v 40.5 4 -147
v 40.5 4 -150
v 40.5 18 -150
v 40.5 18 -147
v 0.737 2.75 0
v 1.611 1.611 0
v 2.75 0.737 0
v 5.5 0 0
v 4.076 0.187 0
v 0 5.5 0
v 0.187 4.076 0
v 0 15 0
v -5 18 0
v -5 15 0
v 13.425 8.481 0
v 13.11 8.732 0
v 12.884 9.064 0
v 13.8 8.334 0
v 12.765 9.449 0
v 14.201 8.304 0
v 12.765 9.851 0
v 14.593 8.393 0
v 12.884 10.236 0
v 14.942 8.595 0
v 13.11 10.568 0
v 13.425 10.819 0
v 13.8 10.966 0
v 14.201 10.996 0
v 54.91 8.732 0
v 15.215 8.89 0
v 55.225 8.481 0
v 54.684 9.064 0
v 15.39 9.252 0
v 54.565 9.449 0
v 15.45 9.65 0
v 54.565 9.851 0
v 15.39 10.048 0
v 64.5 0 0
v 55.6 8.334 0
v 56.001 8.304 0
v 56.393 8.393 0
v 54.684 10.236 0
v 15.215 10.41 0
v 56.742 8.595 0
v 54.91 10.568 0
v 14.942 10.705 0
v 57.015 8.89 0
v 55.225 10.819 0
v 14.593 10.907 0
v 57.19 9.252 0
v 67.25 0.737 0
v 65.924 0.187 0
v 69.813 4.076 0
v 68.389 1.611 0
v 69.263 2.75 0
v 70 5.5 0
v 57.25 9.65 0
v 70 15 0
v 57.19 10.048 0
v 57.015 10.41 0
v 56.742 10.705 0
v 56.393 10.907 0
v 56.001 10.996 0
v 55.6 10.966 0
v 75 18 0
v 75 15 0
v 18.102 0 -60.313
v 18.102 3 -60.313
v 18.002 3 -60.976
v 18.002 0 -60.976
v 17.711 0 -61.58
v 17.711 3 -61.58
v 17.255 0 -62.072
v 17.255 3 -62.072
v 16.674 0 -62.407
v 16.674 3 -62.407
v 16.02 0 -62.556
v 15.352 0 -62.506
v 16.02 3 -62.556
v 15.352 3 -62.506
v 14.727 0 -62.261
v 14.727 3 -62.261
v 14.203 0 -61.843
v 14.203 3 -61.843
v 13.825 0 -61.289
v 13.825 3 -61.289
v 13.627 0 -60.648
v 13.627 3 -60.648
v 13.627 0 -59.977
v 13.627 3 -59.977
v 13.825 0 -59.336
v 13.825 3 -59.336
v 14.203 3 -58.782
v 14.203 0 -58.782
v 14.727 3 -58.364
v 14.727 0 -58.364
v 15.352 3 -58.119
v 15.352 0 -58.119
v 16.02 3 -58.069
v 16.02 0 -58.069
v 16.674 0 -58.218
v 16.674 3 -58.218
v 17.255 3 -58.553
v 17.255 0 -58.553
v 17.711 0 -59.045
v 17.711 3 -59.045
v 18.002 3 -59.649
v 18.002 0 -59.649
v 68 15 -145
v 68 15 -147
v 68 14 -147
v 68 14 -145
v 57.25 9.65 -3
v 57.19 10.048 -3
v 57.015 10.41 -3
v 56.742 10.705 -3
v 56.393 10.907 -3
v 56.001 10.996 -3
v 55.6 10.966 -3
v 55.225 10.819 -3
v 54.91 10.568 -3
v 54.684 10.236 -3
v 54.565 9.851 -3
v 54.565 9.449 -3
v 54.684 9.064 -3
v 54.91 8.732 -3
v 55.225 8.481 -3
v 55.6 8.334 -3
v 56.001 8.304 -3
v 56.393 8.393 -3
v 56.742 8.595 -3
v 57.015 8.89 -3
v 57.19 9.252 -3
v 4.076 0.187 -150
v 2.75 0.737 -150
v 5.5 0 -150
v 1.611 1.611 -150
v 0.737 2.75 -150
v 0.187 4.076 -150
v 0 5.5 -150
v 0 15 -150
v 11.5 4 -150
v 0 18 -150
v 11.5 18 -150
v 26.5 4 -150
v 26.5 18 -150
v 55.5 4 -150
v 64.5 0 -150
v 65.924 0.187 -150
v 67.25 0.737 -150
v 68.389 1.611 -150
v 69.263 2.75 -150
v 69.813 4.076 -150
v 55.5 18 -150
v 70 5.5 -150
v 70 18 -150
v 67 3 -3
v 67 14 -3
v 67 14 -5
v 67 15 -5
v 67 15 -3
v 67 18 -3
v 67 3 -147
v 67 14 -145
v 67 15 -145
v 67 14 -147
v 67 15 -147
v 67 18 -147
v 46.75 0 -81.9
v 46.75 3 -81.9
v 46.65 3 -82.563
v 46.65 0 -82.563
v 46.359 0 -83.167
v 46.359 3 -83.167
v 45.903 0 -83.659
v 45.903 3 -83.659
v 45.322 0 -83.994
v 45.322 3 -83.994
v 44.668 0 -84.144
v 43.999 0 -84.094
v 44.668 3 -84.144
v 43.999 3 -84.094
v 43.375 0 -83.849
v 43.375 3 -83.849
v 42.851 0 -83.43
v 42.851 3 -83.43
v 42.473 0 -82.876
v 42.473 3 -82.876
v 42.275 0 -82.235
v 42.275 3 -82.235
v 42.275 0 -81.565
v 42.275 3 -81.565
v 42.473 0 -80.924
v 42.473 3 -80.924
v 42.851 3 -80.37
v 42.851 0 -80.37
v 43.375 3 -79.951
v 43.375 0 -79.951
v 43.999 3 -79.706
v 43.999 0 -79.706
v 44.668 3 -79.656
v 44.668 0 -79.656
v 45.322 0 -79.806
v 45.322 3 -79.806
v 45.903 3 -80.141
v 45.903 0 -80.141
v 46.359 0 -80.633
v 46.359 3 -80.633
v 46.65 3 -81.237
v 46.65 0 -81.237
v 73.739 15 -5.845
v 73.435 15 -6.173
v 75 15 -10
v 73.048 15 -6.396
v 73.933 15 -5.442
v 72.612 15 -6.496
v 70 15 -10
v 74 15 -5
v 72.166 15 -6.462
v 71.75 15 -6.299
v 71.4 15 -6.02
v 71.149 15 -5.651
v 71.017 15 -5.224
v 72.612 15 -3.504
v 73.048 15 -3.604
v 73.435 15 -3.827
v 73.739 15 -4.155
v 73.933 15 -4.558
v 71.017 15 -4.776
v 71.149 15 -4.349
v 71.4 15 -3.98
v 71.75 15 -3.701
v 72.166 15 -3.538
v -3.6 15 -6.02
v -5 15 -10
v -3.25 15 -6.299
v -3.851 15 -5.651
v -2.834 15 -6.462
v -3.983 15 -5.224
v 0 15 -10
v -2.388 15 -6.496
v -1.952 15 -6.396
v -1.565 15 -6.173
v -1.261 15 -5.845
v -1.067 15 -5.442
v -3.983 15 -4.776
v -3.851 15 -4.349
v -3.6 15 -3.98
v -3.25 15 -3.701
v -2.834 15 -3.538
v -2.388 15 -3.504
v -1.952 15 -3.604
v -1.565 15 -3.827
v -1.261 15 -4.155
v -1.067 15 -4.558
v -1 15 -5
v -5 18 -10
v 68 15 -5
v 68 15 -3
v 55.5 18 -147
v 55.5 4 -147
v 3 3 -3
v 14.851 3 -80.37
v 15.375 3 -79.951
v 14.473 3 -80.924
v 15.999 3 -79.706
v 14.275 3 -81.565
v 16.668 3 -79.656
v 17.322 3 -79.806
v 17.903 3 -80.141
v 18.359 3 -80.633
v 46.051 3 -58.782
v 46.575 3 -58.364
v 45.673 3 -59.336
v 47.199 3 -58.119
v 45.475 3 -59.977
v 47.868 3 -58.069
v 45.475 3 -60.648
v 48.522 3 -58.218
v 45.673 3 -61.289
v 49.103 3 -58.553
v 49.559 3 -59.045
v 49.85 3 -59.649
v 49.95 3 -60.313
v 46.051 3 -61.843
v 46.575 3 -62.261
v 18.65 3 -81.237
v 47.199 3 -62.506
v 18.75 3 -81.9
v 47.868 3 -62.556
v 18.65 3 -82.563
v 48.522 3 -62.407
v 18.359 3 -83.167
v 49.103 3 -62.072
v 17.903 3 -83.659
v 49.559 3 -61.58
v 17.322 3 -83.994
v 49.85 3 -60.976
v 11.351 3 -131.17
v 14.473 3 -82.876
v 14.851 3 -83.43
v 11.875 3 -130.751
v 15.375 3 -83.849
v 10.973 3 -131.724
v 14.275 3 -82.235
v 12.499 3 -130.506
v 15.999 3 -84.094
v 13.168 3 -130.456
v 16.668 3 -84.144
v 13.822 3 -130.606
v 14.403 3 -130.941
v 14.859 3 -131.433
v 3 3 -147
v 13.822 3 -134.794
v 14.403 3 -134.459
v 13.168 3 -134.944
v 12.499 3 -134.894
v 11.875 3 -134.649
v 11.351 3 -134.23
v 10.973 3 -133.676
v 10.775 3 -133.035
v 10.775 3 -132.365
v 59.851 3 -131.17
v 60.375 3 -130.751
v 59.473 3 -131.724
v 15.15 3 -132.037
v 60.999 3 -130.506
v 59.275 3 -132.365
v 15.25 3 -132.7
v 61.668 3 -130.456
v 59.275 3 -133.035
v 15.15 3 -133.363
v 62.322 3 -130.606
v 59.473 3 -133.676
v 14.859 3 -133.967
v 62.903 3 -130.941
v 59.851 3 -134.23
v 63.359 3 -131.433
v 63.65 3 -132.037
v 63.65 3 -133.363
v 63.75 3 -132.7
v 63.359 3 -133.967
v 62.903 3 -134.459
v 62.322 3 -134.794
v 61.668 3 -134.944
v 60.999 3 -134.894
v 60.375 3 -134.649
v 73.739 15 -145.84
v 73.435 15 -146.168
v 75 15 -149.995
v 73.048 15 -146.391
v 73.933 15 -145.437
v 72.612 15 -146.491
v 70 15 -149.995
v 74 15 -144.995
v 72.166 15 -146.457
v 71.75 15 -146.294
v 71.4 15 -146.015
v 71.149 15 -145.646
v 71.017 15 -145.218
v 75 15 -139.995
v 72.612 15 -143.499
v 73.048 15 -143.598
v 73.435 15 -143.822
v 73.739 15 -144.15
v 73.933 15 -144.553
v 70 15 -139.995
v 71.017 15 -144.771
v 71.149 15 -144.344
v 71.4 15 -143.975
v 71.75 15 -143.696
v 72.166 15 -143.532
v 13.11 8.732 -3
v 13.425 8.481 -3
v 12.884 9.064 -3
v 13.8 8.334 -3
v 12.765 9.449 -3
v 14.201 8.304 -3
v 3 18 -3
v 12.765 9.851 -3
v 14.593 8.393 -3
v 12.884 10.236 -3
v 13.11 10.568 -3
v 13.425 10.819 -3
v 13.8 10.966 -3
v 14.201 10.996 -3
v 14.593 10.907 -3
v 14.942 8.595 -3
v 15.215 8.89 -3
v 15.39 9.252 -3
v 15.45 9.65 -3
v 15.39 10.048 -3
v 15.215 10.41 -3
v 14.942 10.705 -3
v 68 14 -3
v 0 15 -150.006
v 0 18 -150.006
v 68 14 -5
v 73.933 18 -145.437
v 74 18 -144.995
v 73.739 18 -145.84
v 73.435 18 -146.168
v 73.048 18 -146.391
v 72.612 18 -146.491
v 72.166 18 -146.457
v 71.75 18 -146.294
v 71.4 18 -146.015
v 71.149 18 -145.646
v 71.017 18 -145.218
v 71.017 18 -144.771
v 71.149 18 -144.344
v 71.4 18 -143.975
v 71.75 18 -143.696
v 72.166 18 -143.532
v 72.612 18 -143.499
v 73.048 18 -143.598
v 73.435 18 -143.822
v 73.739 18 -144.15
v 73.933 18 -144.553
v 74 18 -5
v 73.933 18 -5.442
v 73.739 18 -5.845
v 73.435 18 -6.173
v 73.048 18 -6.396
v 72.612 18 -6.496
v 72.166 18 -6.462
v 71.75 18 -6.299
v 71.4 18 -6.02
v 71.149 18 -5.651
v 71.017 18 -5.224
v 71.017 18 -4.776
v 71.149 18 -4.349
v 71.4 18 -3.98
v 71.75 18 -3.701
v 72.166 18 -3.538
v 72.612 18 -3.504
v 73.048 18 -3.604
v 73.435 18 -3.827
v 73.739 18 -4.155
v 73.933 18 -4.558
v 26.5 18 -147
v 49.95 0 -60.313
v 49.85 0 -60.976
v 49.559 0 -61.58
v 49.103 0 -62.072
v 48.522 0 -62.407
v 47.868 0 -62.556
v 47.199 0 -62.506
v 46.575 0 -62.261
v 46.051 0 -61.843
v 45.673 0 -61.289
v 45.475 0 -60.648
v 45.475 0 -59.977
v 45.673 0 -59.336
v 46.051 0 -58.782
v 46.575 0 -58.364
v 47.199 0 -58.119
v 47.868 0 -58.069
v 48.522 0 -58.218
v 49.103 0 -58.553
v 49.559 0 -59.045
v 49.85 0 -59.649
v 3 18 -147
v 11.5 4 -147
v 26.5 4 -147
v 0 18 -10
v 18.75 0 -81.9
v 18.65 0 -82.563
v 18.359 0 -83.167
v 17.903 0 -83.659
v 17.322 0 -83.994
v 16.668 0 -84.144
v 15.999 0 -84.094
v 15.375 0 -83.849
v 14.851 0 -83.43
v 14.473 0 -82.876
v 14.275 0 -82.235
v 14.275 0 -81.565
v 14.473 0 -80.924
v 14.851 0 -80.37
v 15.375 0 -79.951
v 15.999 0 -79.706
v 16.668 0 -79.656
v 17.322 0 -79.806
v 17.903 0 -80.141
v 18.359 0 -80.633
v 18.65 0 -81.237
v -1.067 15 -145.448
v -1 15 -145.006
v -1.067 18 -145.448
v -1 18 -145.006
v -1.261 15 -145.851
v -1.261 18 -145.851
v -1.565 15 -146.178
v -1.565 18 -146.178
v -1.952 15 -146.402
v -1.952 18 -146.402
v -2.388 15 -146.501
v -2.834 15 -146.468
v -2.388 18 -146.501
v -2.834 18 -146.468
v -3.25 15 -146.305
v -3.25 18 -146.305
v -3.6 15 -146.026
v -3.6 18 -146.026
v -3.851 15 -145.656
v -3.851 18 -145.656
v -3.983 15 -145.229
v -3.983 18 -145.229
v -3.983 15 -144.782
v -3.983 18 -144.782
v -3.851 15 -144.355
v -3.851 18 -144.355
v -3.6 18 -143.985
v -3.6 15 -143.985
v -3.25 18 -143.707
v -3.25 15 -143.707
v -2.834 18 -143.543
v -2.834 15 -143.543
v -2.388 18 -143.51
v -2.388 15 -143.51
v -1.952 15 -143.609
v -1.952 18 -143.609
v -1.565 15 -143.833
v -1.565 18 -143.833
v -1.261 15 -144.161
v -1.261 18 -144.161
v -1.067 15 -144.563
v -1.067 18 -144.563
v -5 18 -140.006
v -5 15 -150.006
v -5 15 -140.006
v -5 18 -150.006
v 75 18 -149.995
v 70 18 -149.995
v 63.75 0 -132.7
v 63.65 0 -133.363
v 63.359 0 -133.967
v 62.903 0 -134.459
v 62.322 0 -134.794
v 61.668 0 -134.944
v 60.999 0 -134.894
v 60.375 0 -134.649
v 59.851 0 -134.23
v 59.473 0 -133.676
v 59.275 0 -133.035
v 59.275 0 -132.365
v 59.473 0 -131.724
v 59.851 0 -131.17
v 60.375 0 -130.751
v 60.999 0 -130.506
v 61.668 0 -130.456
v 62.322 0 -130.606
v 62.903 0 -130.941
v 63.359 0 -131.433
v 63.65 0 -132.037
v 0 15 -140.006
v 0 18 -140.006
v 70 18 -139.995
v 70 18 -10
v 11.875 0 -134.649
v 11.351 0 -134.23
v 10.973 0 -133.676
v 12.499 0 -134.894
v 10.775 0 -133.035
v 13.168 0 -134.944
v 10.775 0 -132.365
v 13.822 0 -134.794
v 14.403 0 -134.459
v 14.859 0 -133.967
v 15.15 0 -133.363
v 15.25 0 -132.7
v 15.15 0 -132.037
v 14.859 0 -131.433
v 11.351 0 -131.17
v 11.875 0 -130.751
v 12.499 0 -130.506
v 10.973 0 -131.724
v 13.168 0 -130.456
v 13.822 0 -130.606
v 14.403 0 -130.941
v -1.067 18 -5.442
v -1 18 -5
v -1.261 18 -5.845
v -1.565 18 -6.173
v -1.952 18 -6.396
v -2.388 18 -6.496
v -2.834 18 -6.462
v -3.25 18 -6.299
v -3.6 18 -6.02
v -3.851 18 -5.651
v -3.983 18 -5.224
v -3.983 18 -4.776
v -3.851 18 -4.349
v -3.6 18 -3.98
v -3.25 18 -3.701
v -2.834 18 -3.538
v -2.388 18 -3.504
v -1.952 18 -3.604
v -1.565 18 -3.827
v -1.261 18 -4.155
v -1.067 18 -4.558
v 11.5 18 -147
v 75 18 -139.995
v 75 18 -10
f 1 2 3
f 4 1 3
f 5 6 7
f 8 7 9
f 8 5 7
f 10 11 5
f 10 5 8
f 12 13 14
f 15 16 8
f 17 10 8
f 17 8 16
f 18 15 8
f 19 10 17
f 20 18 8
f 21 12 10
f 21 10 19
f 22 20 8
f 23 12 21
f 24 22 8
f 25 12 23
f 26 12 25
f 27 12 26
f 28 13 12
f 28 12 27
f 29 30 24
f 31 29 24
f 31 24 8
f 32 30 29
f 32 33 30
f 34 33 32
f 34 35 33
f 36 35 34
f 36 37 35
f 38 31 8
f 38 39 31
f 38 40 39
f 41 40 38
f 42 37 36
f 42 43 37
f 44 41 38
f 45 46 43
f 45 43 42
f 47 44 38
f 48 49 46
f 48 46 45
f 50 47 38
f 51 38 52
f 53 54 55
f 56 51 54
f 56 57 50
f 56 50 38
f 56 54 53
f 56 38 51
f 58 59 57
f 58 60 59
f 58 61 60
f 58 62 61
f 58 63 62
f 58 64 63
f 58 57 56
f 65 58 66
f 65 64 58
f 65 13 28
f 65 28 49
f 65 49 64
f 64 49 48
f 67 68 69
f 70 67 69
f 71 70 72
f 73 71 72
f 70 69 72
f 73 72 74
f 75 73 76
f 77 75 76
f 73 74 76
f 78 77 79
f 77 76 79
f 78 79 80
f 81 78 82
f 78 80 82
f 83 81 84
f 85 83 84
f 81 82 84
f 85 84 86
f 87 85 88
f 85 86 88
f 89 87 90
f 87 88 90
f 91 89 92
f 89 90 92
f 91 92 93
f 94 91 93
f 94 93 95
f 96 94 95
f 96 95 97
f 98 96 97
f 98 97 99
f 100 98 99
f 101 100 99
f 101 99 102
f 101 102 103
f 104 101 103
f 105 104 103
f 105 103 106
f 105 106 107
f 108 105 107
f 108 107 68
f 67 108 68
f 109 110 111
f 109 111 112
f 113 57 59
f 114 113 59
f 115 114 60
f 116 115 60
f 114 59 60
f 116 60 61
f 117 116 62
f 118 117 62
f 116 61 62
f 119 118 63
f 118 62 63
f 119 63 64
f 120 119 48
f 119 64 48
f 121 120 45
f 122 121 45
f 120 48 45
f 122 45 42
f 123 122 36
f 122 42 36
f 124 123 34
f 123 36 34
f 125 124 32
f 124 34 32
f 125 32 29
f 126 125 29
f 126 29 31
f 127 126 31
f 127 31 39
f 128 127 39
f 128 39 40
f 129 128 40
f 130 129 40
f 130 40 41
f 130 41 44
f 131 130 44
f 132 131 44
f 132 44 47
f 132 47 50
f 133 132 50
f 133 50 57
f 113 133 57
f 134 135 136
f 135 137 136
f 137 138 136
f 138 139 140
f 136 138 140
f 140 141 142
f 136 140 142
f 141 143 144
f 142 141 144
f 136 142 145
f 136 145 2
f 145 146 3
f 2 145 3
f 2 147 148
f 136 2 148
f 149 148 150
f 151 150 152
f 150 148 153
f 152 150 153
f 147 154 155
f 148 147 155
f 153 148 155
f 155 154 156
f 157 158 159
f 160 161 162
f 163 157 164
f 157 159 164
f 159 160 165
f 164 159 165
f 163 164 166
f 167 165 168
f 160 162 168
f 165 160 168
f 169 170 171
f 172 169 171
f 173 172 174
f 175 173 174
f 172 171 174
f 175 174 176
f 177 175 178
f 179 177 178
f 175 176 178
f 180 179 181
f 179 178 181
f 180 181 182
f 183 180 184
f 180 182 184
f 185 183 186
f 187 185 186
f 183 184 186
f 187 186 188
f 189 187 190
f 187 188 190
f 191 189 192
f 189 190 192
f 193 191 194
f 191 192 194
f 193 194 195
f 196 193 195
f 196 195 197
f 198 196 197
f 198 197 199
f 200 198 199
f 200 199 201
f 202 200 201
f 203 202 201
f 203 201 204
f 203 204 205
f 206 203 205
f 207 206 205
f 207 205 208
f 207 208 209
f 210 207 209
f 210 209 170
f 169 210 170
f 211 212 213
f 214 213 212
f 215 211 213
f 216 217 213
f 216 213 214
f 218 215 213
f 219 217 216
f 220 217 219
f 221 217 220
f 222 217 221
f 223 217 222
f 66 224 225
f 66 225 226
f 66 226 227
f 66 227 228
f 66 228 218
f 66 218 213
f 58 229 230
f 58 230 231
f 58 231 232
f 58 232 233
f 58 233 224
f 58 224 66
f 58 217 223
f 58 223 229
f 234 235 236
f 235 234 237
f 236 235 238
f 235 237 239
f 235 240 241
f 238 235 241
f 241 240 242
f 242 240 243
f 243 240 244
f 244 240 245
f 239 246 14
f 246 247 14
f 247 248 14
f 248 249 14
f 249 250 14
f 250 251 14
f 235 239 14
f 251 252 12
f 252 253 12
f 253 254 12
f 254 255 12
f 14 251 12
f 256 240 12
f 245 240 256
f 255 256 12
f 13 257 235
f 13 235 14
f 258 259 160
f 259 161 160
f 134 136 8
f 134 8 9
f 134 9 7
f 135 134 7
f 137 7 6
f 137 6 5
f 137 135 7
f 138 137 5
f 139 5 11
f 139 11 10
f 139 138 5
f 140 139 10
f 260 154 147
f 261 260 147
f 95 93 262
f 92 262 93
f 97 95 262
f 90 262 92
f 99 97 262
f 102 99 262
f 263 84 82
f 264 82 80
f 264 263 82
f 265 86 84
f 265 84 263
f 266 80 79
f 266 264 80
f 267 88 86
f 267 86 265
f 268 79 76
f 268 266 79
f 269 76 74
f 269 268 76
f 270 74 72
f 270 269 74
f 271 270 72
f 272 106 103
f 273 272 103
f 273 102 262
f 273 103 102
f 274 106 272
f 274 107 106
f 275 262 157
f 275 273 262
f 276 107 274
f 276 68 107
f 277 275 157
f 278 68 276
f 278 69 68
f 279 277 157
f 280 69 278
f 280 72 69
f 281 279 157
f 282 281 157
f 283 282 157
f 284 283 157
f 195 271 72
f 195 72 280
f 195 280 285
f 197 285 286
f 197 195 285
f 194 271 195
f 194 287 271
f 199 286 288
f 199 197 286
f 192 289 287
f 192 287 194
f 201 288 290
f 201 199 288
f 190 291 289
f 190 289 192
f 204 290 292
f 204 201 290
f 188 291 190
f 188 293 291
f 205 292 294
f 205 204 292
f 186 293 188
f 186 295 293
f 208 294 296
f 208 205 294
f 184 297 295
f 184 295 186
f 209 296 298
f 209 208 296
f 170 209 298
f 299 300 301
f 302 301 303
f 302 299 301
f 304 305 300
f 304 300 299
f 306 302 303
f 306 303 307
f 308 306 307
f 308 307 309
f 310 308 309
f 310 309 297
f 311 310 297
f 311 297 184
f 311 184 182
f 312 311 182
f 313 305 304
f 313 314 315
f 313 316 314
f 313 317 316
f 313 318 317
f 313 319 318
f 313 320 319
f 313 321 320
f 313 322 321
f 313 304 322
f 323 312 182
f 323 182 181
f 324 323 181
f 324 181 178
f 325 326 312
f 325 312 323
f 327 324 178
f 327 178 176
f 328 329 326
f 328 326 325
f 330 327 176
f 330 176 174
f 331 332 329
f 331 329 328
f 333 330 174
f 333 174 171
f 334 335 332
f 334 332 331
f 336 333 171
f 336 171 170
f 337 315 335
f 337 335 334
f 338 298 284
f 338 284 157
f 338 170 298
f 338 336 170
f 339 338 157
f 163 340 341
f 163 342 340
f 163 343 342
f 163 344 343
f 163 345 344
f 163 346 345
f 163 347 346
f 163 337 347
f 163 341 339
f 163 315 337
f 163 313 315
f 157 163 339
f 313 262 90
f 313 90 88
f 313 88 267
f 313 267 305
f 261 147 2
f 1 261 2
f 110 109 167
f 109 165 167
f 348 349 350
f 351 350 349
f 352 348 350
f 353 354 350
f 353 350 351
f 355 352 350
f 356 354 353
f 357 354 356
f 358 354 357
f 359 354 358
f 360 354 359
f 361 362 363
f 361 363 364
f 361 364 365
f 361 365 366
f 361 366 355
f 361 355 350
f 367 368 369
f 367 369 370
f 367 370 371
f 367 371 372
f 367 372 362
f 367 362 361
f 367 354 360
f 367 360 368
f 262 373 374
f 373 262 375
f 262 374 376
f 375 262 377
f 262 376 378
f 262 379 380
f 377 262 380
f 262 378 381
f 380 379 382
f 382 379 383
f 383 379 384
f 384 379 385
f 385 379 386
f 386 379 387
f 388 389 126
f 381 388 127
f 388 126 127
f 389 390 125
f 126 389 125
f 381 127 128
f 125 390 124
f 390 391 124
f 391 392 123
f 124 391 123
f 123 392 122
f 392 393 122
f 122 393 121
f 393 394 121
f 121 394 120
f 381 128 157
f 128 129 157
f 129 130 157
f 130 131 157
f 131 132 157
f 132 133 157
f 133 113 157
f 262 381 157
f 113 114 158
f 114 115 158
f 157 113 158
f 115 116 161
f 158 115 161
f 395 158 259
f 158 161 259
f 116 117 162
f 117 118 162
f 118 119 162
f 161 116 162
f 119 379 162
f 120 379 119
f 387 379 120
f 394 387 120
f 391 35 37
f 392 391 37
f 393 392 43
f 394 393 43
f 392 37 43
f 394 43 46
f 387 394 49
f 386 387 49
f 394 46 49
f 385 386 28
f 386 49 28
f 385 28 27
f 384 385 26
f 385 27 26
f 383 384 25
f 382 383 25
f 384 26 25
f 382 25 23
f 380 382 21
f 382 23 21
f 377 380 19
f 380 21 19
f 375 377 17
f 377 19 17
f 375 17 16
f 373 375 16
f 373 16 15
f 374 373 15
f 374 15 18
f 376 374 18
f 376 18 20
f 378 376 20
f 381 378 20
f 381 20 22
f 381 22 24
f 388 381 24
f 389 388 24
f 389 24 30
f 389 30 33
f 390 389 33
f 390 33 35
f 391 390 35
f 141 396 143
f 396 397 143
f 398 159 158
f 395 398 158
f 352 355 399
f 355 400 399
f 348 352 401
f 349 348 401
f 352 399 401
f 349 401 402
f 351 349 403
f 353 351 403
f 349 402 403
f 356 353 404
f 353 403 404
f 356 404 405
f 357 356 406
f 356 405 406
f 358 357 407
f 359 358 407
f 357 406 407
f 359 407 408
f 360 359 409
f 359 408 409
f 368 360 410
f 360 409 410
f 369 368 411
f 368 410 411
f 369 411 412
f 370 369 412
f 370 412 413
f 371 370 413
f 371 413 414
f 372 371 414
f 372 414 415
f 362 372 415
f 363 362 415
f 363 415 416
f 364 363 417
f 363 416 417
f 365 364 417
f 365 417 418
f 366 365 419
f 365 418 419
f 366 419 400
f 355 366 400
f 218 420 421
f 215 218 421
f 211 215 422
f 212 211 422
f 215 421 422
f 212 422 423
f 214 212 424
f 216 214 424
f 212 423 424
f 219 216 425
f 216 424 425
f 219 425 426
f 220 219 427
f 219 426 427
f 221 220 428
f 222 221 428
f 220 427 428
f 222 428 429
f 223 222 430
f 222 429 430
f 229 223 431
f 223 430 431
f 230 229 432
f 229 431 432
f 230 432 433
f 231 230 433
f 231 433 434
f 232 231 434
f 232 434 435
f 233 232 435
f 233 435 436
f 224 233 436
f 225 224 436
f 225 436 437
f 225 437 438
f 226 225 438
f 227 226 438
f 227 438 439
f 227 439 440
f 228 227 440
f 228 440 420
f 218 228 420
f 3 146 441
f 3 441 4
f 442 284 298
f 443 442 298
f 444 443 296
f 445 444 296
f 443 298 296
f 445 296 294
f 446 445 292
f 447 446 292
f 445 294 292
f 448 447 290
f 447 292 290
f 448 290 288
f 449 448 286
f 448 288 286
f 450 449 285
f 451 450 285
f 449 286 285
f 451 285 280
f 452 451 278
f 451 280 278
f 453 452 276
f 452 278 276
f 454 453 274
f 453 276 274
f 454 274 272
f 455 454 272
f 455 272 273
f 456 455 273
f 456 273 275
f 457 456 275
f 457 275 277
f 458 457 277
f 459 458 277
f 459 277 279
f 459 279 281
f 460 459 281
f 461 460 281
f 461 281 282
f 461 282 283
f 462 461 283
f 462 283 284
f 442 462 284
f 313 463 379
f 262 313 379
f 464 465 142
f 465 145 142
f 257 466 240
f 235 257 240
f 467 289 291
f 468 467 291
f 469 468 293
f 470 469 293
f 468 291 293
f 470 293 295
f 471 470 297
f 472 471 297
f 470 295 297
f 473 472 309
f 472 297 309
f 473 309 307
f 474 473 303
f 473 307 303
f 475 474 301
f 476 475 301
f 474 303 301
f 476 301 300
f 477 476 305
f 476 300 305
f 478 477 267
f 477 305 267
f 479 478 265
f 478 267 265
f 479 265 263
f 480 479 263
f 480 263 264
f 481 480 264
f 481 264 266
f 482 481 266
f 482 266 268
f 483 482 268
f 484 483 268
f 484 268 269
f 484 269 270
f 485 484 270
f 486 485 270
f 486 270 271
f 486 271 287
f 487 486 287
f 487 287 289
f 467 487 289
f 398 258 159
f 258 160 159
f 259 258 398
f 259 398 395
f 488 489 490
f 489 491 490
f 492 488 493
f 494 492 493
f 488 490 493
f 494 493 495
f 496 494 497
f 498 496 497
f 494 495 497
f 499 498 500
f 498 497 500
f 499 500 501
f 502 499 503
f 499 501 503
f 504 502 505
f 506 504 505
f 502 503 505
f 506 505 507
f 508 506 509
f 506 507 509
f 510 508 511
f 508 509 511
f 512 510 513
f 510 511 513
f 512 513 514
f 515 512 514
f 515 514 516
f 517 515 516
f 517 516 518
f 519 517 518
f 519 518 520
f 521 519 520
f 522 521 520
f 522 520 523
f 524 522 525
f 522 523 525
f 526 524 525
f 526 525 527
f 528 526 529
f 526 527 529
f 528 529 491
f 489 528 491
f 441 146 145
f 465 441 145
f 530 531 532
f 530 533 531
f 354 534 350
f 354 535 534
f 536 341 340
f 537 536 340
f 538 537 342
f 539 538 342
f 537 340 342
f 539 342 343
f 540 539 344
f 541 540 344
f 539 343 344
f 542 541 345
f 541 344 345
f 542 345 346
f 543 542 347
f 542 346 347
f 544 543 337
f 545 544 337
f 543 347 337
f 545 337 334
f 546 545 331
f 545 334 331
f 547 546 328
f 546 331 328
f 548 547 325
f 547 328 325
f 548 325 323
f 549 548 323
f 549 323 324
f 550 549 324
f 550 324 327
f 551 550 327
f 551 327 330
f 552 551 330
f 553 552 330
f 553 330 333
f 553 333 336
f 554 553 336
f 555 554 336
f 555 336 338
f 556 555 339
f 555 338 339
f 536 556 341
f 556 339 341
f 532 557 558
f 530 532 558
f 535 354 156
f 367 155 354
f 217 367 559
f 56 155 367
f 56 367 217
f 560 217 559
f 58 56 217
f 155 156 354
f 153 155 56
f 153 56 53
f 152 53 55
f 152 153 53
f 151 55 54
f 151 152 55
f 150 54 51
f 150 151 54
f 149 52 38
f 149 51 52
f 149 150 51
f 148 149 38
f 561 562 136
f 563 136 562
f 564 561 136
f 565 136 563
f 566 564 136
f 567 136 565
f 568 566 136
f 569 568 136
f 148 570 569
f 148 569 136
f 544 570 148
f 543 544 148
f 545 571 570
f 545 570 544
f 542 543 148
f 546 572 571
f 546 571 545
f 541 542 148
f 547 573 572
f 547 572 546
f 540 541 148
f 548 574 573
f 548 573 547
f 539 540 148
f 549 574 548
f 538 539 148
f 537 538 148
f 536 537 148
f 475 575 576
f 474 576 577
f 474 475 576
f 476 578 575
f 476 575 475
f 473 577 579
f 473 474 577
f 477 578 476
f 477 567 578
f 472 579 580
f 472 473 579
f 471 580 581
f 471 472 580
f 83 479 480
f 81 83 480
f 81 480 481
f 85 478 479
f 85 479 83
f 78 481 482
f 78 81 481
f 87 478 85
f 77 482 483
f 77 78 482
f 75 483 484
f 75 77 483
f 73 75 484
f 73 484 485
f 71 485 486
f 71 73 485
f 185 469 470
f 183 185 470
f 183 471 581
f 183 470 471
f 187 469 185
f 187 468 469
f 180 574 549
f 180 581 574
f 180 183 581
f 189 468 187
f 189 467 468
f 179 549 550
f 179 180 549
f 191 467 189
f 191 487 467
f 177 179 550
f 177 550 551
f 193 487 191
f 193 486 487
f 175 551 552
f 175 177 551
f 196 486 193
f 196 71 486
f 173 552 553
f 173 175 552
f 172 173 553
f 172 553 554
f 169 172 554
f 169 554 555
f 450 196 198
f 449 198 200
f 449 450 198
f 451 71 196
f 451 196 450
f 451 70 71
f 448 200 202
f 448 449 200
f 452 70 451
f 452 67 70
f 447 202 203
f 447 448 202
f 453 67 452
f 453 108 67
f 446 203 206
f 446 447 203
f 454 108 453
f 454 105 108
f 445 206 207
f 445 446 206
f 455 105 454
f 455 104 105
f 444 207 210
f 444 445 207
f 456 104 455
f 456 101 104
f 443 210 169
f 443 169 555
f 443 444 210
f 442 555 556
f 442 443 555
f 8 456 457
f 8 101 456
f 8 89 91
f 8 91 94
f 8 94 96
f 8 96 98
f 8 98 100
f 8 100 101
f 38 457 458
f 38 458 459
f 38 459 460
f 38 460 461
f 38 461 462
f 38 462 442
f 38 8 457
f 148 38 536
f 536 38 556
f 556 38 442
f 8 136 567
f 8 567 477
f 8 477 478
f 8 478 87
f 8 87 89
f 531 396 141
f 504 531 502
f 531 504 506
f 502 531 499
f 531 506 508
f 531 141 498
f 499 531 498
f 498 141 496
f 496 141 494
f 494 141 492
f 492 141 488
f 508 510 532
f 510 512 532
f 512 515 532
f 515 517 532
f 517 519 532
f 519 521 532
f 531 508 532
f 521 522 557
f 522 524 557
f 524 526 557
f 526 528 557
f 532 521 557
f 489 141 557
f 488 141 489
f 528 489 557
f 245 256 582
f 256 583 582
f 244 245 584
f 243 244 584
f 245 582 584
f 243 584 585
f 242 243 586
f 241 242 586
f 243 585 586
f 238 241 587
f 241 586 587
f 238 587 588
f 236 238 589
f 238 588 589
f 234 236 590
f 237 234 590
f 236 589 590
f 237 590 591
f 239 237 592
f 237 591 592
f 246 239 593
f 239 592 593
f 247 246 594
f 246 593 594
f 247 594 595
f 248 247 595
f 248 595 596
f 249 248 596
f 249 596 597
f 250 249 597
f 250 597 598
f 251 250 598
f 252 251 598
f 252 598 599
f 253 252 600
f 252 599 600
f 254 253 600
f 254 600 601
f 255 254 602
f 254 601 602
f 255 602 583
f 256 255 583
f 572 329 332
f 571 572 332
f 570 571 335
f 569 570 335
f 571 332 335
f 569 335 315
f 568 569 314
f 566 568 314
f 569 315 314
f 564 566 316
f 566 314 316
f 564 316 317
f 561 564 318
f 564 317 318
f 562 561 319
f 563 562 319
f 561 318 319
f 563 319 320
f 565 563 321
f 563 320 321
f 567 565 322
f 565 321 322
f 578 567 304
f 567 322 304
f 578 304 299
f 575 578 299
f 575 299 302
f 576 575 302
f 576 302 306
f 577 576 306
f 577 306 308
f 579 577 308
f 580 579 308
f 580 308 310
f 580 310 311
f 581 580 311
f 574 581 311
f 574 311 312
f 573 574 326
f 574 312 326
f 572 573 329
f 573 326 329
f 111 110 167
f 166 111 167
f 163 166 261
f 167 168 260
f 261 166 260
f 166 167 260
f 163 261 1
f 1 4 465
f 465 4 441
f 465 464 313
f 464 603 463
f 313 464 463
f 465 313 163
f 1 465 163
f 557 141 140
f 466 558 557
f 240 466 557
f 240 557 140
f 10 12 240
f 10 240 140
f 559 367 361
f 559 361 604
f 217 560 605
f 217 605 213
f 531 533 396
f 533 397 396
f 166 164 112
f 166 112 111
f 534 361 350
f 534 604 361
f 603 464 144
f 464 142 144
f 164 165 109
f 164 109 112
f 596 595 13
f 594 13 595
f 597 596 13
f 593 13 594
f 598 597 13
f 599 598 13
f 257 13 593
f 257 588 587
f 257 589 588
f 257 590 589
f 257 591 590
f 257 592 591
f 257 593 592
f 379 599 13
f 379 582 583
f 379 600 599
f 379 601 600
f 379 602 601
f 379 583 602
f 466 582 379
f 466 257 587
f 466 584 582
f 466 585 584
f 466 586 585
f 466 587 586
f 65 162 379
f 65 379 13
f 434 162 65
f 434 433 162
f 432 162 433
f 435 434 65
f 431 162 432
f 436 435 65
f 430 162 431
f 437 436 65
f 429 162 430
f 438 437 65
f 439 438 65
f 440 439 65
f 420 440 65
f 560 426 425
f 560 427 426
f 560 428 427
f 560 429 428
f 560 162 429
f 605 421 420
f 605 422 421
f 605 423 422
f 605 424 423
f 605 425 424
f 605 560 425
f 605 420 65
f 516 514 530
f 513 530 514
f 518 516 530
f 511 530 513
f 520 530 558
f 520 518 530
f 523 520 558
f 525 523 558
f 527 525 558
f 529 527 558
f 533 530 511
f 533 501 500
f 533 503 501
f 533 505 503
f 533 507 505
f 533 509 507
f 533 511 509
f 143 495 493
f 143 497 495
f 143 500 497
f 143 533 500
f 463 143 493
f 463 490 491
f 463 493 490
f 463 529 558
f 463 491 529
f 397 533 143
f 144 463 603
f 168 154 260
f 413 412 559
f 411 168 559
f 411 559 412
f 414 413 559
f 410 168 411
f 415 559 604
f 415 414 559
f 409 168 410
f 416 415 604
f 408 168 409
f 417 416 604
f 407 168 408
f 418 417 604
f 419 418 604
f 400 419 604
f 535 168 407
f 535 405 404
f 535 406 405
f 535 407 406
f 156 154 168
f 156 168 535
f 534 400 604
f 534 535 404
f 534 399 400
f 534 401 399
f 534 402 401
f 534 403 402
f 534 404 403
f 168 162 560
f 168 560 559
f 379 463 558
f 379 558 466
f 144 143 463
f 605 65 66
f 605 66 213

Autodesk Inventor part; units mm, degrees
ref_plane "YZ Plane" through (0, 0, 0) normal (1, 0, 0) x (0, 1, 0)
ref_plane "XZ Plane" through (0, 0, 0) normal (0, 1, 0) x (-1, 0, 0)
ref_plane "XY Plane" through (0, 0, 0) normal (0, 0, 1) x (1, 0, 0)
sketch "Sketch7" plane through (0, 0, 0) normal (0, 0, 1) x (1, 0, 0)
  line L0 (0, 0) -> (70, 0)
  line L1 (70, 0) -> (70, 30)
  line L2 (70, 30) -> (0, 30)
  line L3 (0, 30) -> (0, 0)
  dimension "d25" = 70
  dimension "d26" = 30
extrude "Extrusion5" add sketch "Sketch7" against normal blind 150
sketch "Sketch8" plane through (0, 30, 0) normal (0, 1, 0) x (1, 0, 0)
  line L0 (0, 0) -> (3, 0)
  line L1 (3, 0) -> (3, 3)
  line L2 (3, 3) -> (0, 3)
  line L3 (0, 3) -> (0, 0)
  line L4 (70, 150) -> (67, 150)
  line L5 (67, 150) -> (67, 147)
  line L6 (67, 147) -> (70, 147)
  line L7 (70, 147) -> (70, 150)
  line L8 (3, 3) -> (67, 3)
  line L9 (67, 3) -> (67, 147)
  line L10 (67, 147) -> (3, 147)
  line L11 (3, 147) -> (3, 3)
  dimension "d29" = 3
  dimension "d30" = 3
  dimension "d31" = 3
  dimension "d32" = 3
extrude "Extrusion6" cut sketch "Sketch8" against normal blind 27 contours L11 L10 L9 L8
sketch "Sketch10" plane through (0, 0, -150) normal (0, 0, -1) x (-1, 0, 0)
  line L0 (-70, 30) -> (-70, 0) projected
  line L1 (-70, 0) -> (-61.5, 0)
  line L2 (-70, 4) -> (-70, 0)
  line L3 (0, 0) -> (0, 30) projected
  line L4 (0, 0) -> (-8.5, 0)
  line L5 (0, 4) -> (0, 0)
  line L6 (-54.5, 4) -> (-41.5, 4)
  line L7 (-61.5, 0) -> (-51.709, 0)
  line L8 (-8.5, 0) -> (-41.5, 0)
  line L9 (-26.0357, 0) -> (-23.5, 0)
  line L10 (-40.5, 4) -> (-40.5, 30)
  line L11 (-40.5, 30) -> (-55.5, 30)
  line L12 (-55.5, 30) -> (-55.5, 4)
  line L13 (-70, 0) -> (0, 0) projected
  line L14 (-55.5, 0) -> (-40.5, 0)
  line L15 (-55.5, 4) -> (-40.5, 4)
  line L16 (-11.5, 4) -> (-11.5, 30)
  line L17 (-11.5, 30) -> (-26.5, 30)
  line L18 (-26.5, 30) -> (-26.5, 4)
  line L19 (-26.5, 4) -> (-11.5, 4)
  point P0 (-48, 10)
  dimension "d188" = 15
  dimension "d189" = 15
sketch "Sketch15" plane through (0, 0, -150) normal (0, 0, -1) x (-1, 0, 0)
  line L0 (-70, 30) -> (-70, 0) projected
  line L1 (0, 30) -> (0, 0) projected
  line L2 (-70, 30) -> (0, 30)
  line L3 (0, 30) -> (0, 18)
  line L4 (0, 18) -> (-70, 18)
  line L5 (-70, 18) -> (-70, 30)
  dimension "d100" = 12
extrude "Extrusion10" cut sketch "Sketch15" against normal blind 10000
sketch "Sketch20" plane through (67, 3, -147) normal (-1, 0, 0) x (0, 0, 1)
  line L0 (0, 15) -> (144, 15)
  line L1 (144, 15) -> (144, 12)
  line L2 (144, 12) -> (0, 12)
  line L3 (0, 12) -> (0, 15)
  line L4 (0, 12) -> (2, 12)
  line L5 (2, 12) -> (2, 11)
  line L6 (2, 11) -> (0, 11)
  line L7 (0, 11) -> (0, 12)
  line L8 (144, 12) -> (142, 12)
  line L9 (142, 12) -> (142, 11)
  line L10 (142, 11) -> (144, 11)
  line L11 (144, 11) -> (144, 12)
  point P0 (147, -3)
  point P1 (2, 12)
  dimension "d132" = 144
  dimension "d133" = 3
  dimension "d134" = 2
  dimension "d135" = 1
  dimension "d136" = 2
  dimension "d137" = 1
extrude "Extrusion17" cut sketch "Sketch20" against normal blind 1 contours L2 L5 L6 L7 | L11 L10 L9 L2
sketch "Sketch21" plane through (70, 0, 0) normal (1, 0, 0) x (0, 0, -1)
  line L0 (0, 0) -> (0, 18) projected
  line L1 (0, 18) -> (10, 18)
  line L2 (10, 18) -> (10, 15)
  line L3 (10, 15) -> (0, 15)
  line L4 (0, 15) -> (0, 18)
  line L5 (139.9948, 18) -> (149.9948, 18)
  line L6 (149.9948, 18) -> (149.9948, 15)
  line L7 (149.9948, 15) -> (139.9948, 15)
  line L8 (139.9948, 15) -> (139.9948, 18)
  dimension "d144" = 10
  dimension "d145" = 3
  dimension "d146" = 10
  dimension "d147" = 3
extrude "Extrusion18" add sketch "Sketch21" along normal blind 5
sketch "Sketch23" plane through (0, 0, -150) normal (-1, 0, 0) x (0, 0, 1)
  line L0 (150, 18) -> (147, 18) projected
  line L1 (150, 18) -> (140, 18)
  line L2 (140, 18) -> (140, 15)
  line L3 (140, 15) -> (150, 15)
  line L4 (150, 15) -> (150, 18)
  line L5 (9.9944, 18) -> (-0.0056, 18)
  line L6 (-0.0056, 18) -> (-0.0056, 15)
  line L7 (-0.0056, 15) -> (9.9944, 15)
  line L8 (9.9944, 15) -> (9.9944, 18)
  point P0 (150, 0)
  point P1 (149.4, 18)
  point P2 (149.4, 18)
  dimension "d158" = 10
  dimension "d159" = 3
  dimension "d160" = 10
  dimension "d161" = 3
extrude "Extrusion20" add sketch "Sketch23" along normal blind 5
sketch "Sketch25" plane through (3, 18, -147) normal (0, 1, 0) x (1, 0, 0)
  line L0 (72, -147) -> (-8, -147) projected
  line L1 (-8, -147) -> (-5.5, -147)
  line L2 (-8, -142) -> (-8, -147)
  line L3 (53.15, -147) -> (72, -147) projected
  line L4 (72, -147) -> (69.5, -147)
  line L5 (72, -142) -> (72, -147)
  line L6 (72, 2.9948) -> (69.5, 2.9948)
  line L7 (72, -2.0052) -> (72, 2.9948)
  line L8 (-8, 3.0056) -> (-8, -6.9944) projected
  line L9 (-8, 3.0056) -> (-5.5, 3.0056)
  line L10 (-8, -1.9944) -> (-8, 3.0056)
  circle A0 centre (-5.5, -1.9944) radius 1.5
  circle A1 centre (69.5, -2.0052) radius 1.5
  circle A2 centre (69.5, -142) radius 1.5
  circle A3 centre (-5.5, -142) radius 1.5
  point P0 (-3, -147)
  point P1 (10.85, -147)
  dimension "d180" = 3
  dimension "d181" = 3
  dimension "d182" = 3
  dimension "d183" = 3
extrude "Extrusion22" cut sketch "Sketch25" against normal blind 10
extrude "Extrusion23" cut sketch "Sketch10" against normal blind 10
sketch "Sketch26" plane through (0, 3, 0) normal (0, 1, 0) x (1, 0, 0)
  line L0 (3, 147) -> (67, 147) projected
  line L1 (3, 147) -> (13, 147)
  line L2 (3, 132.7) -> (3, 147)
  line L3 (61.5, 121.8573) -> (13, 121.8573)
  line L4 (16.5, 91.8787) -> (44.5, 91.8787)
  circle A0 centre (16.5, 81.9) radius 2.25
  circle A1 centre (44.5, 81.9) radius 2.25
  circle A2 centre (61.5, 132.7) radius 2.25
  circle A3 centre (13, 132.7) radius 2.25
  point P0 (0, 0)
  dimension "d195" = 48.5
  dimension "d200" = 28
  dimension "d233" = 4.5
  dimension "d234" = 4.5
  dimension "d235" = 4.5
  dimension "d236" = 4.5
fillet "Face Fillet3" radius 5.5 1 edges at (70, 0, -75)
fillet "Face Fillet4" radius 5.5 1 edges at (0, 0, -75)
sketch "Sketch27" plane through (0, 0, 0) normal (0, 0, 1) x (1, 0, 0)
  line L0 (12.25, 28.2) -> (57.75, 28.2)
  line L1 (57.75, 28.2) -> (57.75, 7.8)
  line L2 (57.75, 7.8) -> (12.25, 7.8)
  line L3 (12.25, 7.8) -> (12.25, 28.2)
  line L4 (75, 18) -> (-5, 18) projected
  line L5 (57.75, 28.2) -> (12.25, 7.8) construction
  line L6 (12.25, 7.8) -> (12.75, 7.8)
  line L7 (12.25, 8.3) -> (12.25, 7.8)
  line L8 (57.75, 7.8) -> (57.25, 7.8)
  line L9 (57.75, 8.3) -> (57.75, 7.8)
  circle A0 centre (14.1, 9.65) radius 1.35
  line L10 (15.95, 7.8) -> (15.45, 7.8)
  circle A1 centre (55.9, 9.65) radius 1.35
  line L11 (57.75, 8.3) -> (57.75, 7.8)
  point P0 (0, 0)
  point P1 (35, 18)
  dimension "d210" = 45.5
  dimension "d211" = 20.4
  dimension "d218" = 2.7
  dimension "d219" = 0.5
  dimension "d221" = 2.7
  dimension "d223" = 0.5
extrude "Extrusion27" cut sketch "Sketch27" against normal blind 10 contours A0 | A1
sketch "Sketch28" plane through (0, 3, 0) normal (0, 1, 0) x (1, 0, 0)
  line L0 (51.8999, 76.8126) -> (11.6522, 76.8126)
  line L1 (11.6522, 76.8126) -> (11.6522, 60.3126)
  line L2 (51.8999, 60.3126) -> (51.8999, 76.8126)
  line L3 (51.8999, 58.2305) -> (51.8999, 60.3126)
  circle A0 centre (47.6999, 60.3126) radius 2.25
  line L4 (11.6522, 57.5365) -> (11.6522, 60.3126)
  circle A1 centre (15.8522, 60.3126) radius 2.25
  point P0 (0, 0)
  dimension "d226" = 16.5
  dimension "d228" = 4.5
  dimension "d230" = 4.5
extrude "Extrusion28" cut sketch "Sketch28" against normal blind 10
extrude "Extrusion29" cut sketch "Sketch26" against normal blind 10
properties part number "BOT_HOLDER_ENGR-2200_3DPrint"
